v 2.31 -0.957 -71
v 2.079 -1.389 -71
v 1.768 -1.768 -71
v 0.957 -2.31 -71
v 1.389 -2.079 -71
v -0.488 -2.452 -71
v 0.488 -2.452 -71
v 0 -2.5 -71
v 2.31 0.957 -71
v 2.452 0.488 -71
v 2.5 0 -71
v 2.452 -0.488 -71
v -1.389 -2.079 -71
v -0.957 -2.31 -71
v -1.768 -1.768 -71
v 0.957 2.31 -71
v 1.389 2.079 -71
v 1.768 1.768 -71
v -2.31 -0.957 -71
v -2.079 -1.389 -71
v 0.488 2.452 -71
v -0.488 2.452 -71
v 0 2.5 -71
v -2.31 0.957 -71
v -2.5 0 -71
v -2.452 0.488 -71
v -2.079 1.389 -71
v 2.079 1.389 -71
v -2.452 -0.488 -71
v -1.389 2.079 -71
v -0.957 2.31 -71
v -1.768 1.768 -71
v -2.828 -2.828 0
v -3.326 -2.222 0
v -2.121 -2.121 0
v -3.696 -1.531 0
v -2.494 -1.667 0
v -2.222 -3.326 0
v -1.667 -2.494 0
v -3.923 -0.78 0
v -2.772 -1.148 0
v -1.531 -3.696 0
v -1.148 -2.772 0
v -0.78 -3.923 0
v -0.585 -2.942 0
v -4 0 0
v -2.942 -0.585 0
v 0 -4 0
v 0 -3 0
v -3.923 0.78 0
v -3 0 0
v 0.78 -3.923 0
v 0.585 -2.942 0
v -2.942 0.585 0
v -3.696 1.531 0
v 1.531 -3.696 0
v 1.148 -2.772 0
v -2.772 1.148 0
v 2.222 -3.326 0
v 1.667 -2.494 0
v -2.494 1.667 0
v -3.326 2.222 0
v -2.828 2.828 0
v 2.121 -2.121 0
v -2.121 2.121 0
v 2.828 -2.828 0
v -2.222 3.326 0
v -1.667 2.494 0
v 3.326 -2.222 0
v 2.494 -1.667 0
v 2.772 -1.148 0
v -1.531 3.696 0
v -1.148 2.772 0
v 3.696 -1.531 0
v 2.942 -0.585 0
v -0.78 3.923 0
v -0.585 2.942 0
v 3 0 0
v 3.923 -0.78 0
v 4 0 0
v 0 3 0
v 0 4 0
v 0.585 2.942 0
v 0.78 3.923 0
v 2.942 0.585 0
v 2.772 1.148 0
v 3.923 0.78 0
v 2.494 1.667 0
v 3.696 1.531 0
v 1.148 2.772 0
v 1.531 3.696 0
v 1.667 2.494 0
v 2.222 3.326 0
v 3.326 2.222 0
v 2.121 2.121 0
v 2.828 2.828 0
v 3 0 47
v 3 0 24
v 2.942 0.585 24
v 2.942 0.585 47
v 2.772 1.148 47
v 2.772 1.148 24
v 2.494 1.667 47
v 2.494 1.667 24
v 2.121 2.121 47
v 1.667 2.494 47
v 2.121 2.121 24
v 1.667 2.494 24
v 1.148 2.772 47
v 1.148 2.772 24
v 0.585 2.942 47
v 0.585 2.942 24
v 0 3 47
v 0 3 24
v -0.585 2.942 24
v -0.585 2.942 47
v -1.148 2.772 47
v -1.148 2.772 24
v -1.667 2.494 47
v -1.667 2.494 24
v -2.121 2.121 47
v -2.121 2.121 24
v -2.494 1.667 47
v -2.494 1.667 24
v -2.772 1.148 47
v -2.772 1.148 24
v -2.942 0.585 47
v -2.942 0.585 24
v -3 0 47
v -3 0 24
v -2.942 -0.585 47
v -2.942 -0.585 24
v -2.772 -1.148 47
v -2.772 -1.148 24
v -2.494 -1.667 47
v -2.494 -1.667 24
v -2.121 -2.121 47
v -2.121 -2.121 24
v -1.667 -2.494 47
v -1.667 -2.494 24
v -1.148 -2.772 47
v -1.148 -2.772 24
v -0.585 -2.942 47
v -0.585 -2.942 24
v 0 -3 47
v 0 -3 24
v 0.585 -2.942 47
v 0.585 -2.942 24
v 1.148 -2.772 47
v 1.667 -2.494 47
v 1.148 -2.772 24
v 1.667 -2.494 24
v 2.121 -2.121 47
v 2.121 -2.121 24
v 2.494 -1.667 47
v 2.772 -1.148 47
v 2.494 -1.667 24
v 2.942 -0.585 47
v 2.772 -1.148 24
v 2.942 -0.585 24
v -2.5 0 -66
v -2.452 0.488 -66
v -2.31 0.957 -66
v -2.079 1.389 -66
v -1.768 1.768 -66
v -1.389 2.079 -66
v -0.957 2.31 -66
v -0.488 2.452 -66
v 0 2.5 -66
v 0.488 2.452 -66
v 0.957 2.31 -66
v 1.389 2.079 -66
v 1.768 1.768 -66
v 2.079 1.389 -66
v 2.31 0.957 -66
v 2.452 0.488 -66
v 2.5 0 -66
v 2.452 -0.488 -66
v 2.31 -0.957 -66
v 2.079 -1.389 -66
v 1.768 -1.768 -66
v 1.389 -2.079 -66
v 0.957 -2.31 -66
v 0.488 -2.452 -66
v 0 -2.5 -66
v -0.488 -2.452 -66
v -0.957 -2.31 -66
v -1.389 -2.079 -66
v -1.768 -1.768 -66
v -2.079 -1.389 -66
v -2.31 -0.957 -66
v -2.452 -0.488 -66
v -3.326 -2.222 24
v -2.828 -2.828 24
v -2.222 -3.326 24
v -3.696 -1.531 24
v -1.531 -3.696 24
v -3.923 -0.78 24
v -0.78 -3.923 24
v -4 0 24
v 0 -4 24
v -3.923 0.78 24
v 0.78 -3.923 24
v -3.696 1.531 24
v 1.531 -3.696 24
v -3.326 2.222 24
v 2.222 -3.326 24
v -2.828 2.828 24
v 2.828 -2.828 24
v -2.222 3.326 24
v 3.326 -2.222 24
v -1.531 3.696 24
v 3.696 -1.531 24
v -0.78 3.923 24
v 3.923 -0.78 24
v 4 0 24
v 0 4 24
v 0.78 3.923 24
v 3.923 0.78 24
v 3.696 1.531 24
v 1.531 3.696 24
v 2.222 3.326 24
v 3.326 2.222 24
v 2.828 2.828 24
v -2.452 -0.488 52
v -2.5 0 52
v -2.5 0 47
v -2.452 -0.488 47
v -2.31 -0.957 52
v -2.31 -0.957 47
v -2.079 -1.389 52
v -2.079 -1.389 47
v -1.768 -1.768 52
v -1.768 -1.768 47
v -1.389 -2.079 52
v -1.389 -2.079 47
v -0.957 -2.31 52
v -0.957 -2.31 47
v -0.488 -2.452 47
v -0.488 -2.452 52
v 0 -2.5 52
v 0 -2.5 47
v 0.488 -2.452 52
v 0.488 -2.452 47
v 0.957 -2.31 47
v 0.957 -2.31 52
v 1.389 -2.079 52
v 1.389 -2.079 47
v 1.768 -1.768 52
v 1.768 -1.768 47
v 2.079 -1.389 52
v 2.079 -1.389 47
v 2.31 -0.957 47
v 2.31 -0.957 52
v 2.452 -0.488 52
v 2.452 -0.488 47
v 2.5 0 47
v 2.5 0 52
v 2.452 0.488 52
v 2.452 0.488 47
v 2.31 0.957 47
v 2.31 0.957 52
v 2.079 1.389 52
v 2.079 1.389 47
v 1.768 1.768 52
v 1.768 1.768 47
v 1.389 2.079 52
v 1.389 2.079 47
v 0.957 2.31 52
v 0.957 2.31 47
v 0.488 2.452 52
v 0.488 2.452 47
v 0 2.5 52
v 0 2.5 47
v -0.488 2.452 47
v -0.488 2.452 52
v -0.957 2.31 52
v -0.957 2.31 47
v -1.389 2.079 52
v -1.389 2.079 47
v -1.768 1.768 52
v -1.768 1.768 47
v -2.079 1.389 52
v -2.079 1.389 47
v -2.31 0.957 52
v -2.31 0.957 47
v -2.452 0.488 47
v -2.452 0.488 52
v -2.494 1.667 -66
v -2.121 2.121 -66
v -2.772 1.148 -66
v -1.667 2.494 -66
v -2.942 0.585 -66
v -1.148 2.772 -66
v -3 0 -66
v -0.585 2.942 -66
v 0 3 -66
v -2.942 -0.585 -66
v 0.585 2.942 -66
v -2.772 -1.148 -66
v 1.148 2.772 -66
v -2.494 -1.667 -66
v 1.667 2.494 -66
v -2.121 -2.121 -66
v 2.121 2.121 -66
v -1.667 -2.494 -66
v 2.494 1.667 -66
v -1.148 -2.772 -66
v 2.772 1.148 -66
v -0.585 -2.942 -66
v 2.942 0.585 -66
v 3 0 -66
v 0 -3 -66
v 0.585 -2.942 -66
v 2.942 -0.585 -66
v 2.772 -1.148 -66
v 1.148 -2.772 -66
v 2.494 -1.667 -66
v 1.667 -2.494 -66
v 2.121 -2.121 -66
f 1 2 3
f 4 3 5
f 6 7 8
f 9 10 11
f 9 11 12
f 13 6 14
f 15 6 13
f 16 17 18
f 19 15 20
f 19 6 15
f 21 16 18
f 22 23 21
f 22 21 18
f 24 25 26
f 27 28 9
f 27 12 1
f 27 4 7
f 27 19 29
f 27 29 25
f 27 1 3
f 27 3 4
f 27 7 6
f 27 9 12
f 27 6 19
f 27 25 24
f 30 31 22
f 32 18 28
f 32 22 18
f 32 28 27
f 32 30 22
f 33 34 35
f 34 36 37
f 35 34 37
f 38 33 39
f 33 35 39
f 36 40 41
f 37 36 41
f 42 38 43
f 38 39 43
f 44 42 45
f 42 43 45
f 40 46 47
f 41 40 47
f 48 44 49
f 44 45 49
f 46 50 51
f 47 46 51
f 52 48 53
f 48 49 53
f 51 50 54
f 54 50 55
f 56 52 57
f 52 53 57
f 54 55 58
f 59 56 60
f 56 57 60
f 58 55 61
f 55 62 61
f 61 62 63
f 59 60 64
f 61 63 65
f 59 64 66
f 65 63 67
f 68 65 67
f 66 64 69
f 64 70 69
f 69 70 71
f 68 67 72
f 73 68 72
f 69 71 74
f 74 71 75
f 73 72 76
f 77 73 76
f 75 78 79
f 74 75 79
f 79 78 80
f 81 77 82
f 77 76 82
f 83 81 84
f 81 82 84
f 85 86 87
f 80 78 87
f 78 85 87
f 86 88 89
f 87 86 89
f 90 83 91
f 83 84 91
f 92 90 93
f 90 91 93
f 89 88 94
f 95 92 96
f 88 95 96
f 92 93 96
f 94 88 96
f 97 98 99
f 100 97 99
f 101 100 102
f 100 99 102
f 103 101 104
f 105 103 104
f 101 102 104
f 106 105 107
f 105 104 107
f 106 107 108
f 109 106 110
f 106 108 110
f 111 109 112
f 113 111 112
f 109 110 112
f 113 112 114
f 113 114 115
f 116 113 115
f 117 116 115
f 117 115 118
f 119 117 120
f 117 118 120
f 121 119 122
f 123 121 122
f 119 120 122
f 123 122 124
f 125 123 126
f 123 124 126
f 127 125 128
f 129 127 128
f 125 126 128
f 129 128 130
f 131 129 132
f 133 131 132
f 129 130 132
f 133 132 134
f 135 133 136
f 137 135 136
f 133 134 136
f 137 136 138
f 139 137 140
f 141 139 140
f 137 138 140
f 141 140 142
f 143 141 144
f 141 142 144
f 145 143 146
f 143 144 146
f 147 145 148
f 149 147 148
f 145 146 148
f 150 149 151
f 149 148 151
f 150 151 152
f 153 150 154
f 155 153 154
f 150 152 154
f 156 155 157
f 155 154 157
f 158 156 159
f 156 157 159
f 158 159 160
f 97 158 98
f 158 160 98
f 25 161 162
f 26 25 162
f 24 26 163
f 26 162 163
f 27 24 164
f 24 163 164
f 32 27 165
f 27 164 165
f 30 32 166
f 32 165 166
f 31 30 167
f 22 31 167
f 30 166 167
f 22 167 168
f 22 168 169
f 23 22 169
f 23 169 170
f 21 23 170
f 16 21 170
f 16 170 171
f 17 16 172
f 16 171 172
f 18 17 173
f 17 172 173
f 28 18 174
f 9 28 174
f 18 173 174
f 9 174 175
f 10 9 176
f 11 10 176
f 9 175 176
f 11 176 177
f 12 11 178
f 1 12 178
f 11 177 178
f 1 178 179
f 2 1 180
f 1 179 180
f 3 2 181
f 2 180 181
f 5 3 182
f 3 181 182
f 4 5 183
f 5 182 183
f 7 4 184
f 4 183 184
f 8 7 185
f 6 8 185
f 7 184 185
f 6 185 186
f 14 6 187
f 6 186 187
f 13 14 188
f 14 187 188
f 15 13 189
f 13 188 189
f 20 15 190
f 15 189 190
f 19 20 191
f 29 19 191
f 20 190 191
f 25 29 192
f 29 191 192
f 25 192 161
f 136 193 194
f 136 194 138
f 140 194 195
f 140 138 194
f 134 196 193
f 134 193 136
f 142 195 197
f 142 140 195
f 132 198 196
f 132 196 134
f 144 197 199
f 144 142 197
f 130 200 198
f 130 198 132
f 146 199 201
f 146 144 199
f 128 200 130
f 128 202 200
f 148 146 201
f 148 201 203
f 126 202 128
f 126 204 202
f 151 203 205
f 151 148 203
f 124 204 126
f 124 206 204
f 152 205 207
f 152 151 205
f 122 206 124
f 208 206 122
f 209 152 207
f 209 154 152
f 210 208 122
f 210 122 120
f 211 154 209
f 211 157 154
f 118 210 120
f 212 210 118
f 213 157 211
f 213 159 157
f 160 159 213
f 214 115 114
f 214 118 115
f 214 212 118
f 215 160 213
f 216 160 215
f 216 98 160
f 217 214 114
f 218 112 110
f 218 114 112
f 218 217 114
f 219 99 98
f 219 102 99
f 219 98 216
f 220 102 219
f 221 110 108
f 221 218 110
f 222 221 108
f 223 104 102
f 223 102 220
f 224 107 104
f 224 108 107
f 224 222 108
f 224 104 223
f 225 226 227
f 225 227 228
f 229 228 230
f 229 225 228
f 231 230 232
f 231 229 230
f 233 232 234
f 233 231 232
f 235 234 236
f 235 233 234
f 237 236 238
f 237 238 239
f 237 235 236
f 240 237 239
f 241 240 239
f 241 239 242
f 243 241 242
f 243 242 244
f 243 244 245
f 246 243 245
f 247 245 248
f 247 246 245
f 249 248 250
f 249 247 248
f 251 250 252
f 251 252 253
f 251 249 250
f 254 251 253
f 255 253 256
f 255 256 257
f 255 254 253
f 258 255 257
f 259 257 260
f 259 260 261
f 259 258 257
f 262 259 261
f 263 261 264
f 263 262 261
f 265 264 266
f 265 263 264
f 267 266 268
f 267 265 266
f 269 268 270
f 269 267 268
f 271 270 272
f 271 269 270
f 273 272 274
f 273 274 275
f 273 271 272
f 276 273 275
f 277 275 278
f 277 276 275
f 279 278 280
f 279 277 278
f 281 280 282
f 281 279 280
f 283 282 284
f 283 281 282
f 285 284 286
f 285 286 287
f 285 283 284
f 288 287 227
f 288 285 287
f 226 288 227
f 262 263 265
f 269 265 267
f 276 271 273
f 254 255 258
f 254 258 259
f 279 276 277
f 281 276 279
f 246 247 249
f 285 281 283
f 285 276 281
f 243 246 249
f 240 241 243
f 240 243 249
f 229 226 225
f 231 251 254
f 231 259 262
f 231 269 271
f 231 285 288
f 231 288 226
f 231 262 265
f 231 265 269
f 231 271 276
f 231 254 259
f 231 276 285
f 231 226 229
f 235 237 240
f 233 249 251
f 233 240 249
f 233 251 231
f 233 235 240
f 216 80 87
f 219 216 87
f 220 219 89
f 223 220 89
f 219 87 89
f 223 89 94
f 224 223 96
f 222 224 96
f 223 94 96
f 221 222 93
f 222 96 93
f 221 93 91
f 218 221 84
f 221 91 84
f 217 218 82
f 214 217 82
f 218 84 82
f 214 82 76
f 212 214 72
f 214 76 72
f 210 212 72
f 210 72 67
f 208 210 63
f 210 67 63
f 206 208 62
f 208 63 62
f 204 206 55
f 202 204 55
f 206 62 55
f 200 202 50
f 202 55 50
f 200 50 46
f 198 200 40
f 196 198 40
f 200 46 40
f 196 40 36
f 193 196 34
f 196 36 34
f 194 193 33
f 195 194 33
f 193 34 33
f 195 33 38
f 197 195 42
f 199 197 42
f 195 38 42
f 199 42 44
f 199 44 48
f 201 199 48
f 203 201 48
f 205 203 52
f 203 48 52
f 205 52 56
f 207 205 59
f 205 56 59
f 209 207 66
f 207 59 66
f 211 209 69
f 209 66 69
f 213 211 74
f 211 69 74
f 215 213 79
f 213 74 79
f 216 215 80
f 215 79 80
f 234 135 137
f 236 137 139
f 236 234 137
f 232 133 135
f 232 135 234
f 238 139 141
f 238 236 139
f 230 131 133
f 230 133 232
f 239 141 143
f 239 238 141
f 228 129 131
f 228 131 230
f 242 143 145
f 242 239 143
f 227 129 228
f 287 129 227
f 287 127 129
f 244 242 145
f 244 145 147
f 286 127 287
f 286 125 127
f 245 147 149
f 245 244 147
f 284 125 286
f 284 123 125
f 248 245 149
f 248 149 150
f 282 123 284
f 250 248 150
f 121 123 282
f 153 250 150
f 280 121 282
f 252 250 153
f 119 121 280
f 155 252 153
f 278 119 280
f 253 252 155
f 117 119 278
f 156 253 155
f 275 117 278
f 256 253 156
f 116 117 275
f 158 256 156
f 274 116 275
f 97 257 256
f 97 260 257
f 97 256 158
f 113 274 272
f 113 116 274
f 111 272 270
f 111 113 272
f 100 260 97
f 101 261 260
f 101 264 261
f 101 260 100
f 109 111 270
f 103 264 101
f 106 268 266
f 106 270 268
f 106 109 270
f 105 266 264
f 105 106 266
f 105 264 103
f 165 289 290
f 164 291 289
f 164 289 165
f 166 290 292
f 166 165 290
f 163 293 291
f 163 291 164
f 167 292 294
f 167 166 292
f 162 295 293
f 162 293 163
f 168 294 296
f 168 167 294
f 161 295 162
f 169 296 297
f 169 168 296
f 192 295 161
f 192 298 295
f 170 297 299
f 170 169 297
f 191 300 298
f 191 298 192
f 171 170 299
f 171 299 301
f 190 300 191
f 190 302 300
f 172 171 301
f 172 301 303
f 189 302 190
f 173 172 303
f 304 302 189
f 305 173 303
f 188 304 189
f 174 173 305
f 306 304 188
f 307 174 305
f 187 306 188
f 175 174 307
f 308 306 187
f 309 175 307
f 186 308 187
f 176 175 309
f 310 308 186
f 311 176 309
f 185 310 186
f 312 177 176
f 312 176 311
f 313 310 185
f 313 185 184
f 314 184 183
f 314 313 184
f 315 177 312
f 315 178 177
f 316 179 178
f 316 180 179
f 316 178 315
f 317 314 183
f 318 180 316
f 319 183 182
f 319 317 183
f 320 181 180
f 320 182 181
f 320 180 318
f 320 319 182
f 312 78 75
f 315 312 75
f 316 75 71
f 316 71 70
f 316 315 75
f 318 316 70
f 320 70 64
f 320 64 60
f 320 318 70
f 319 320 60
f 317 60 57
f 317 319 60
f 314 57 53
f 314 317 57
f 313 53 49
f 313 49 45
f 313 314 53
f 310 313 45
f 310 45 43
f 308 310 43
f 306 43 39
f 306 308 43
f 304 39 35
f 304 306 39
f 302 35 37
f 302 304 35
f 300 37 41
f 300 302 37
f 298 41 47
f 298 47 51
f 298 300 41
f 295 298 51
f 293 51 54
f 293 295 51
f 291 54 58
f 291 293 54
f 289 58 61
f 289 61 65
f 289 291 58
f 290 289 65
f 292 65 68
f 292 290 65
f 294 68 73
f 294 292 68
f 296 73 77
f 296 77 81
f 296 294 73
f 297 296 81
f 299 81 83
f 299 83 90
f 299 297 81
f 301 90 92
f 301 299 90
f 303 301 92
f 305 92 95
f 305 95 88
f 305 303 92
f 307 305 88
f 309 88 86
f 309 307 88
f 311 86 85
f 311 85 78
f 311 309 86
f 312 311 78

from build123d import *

# Parameters (mm, degrees)
SKETCH_1_R      = 4
EXTRUDE_1_DEPTH = 24
SKETCH_2_R      = 3
EXTRUDE_2_DEPTH = 23
EXTRUDE_START   = 66
SKETCH_3_R      = 3
EXTRUDE_3_DEPTH = 66
SKETCH_4_R      = 2.5
EXTRUDE_4_DEPTH = 5
EXTRUDE_START_2 = 5
SKETCH_6_R      = 2.5
EXTRUDE_5_DEPTH = 5


with BuildPart() as part:
    # 草图1 → 凸台-拉伸1 (new body)
    with BuildSketch(Plane.XY):
        Circle(SKETCH_1_R)
    extrude(amount=EXTRUDE_1_DEPTH)

    # 草图2 → 凸台-拉伸2 (add)
    with BuildSketch(Plane.XY.offset(24)):
        Circle(SKETCH_2_R)
    extrude(amount=EXTRUDE_2_DEPTH)

    # 草图3 → 凸台-拉伸3 (add)
    with BuildSketch(Plane(origin=(0, 0, 0), x_dir=(-1, 0, 0), z_dir=(0, 0, -1)).offset(EXTRUDE_START)):
        with Locations(Location((0, 0, 0), (0, 0, 180))):
            Circle(SKETCH_3_R)
    extrude(amount=-EXTRUDE_3_DEPTH)

    # 草图4 → 凸台-拉伸4 (add)
    with BuildSketch(Plane(origin=(0, 0, -66), x_dir=(-1, 0, 0), z_dir=(0, 0, -1))):
        Circle(SKETCH_4_R)
    extrude(amount=EXTRUDE_4_DEPTH)

    # 草图6 → 凸台-拉伸5 (add)
    with BuildSketch(Plane.XY.offset(47).offset(EXTRUDE_START_2)):
        with Locations(Location((0, 0, 0), (0, 0, 180))):
            Circle(SKETCH_6_R)
    extrude(amount=-EXTRUDE_5_DEPTH)


solid = part.part
